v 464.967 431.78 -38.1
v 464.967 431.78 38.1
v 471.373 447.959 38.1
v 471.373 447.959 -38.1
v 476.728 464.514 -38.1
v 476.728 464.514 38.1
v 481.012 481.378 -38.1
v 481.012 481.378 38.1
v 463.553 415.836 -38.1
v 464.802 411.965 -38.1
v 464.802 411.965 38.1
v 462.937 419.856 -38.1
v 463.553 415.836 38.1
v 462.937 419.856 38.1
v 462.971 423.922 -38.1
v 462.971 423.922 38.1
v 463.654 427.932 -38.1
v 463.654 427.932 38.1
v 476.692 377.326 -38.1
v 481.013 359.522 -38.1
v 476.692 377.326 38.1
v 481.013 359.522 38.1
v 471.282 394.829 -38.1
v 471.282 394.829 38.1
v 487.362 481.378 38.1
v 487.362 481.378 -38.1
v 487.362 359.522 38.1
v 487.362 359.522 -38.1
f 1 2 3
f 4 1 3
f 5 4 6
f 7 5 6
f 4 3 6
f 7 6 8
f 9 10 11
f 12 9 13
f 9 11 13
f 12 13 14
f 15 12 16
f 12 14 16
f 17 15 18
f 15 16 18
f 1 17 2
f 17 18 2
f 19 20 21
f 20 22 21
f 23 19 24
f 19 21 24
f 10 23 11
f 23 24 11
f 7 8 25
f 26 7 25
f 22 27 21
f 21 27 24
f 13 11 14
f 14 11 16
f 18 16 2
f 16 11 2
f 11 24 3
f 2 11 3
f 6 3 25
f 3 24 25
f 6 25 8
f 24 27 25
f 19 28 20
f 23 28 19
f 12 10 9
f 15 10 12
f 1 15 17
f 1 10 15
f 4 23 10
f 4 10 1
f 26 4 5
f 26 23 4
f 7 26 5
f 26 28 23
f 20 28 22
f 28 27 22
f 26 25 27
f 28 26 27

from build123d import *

# Parameters (mm, degrees)
BOSS_EXTRUDE1_DEPTH = 38.1


with BuildPart() as part:
    # Sketch1 → Boss-Extrude1 (new body, symmetric)
    with BuildSketch(Plane.XY):
        with BuildLine():
            Line((487.3625, 481.378335213), (487.3625, 359.522344396))
            Line((487.3625, 359.522344396), (481.0125, 359.522344396))
            ThreePointArc((481.0125, 359.522344396), (474.121977685, 386.119365688), (464.802007403, 411.965429089))
            ThreePointArc((464.802007403, 411.965429089), (462.872580153, 421.889683903), (464.967167576, 431.780398065))
            ThreePointArc((464.967167576, 431.780398065), (474.183122715, 456.193328053), (481.0125, 481.378335213))
            Line((481.0125, 481.378335213), (487.3625, 481.378335213))
        make_face()
    extrude(amount=BOSS_EXTRUDE1_DEPTH, both=True)


solid = part.part
